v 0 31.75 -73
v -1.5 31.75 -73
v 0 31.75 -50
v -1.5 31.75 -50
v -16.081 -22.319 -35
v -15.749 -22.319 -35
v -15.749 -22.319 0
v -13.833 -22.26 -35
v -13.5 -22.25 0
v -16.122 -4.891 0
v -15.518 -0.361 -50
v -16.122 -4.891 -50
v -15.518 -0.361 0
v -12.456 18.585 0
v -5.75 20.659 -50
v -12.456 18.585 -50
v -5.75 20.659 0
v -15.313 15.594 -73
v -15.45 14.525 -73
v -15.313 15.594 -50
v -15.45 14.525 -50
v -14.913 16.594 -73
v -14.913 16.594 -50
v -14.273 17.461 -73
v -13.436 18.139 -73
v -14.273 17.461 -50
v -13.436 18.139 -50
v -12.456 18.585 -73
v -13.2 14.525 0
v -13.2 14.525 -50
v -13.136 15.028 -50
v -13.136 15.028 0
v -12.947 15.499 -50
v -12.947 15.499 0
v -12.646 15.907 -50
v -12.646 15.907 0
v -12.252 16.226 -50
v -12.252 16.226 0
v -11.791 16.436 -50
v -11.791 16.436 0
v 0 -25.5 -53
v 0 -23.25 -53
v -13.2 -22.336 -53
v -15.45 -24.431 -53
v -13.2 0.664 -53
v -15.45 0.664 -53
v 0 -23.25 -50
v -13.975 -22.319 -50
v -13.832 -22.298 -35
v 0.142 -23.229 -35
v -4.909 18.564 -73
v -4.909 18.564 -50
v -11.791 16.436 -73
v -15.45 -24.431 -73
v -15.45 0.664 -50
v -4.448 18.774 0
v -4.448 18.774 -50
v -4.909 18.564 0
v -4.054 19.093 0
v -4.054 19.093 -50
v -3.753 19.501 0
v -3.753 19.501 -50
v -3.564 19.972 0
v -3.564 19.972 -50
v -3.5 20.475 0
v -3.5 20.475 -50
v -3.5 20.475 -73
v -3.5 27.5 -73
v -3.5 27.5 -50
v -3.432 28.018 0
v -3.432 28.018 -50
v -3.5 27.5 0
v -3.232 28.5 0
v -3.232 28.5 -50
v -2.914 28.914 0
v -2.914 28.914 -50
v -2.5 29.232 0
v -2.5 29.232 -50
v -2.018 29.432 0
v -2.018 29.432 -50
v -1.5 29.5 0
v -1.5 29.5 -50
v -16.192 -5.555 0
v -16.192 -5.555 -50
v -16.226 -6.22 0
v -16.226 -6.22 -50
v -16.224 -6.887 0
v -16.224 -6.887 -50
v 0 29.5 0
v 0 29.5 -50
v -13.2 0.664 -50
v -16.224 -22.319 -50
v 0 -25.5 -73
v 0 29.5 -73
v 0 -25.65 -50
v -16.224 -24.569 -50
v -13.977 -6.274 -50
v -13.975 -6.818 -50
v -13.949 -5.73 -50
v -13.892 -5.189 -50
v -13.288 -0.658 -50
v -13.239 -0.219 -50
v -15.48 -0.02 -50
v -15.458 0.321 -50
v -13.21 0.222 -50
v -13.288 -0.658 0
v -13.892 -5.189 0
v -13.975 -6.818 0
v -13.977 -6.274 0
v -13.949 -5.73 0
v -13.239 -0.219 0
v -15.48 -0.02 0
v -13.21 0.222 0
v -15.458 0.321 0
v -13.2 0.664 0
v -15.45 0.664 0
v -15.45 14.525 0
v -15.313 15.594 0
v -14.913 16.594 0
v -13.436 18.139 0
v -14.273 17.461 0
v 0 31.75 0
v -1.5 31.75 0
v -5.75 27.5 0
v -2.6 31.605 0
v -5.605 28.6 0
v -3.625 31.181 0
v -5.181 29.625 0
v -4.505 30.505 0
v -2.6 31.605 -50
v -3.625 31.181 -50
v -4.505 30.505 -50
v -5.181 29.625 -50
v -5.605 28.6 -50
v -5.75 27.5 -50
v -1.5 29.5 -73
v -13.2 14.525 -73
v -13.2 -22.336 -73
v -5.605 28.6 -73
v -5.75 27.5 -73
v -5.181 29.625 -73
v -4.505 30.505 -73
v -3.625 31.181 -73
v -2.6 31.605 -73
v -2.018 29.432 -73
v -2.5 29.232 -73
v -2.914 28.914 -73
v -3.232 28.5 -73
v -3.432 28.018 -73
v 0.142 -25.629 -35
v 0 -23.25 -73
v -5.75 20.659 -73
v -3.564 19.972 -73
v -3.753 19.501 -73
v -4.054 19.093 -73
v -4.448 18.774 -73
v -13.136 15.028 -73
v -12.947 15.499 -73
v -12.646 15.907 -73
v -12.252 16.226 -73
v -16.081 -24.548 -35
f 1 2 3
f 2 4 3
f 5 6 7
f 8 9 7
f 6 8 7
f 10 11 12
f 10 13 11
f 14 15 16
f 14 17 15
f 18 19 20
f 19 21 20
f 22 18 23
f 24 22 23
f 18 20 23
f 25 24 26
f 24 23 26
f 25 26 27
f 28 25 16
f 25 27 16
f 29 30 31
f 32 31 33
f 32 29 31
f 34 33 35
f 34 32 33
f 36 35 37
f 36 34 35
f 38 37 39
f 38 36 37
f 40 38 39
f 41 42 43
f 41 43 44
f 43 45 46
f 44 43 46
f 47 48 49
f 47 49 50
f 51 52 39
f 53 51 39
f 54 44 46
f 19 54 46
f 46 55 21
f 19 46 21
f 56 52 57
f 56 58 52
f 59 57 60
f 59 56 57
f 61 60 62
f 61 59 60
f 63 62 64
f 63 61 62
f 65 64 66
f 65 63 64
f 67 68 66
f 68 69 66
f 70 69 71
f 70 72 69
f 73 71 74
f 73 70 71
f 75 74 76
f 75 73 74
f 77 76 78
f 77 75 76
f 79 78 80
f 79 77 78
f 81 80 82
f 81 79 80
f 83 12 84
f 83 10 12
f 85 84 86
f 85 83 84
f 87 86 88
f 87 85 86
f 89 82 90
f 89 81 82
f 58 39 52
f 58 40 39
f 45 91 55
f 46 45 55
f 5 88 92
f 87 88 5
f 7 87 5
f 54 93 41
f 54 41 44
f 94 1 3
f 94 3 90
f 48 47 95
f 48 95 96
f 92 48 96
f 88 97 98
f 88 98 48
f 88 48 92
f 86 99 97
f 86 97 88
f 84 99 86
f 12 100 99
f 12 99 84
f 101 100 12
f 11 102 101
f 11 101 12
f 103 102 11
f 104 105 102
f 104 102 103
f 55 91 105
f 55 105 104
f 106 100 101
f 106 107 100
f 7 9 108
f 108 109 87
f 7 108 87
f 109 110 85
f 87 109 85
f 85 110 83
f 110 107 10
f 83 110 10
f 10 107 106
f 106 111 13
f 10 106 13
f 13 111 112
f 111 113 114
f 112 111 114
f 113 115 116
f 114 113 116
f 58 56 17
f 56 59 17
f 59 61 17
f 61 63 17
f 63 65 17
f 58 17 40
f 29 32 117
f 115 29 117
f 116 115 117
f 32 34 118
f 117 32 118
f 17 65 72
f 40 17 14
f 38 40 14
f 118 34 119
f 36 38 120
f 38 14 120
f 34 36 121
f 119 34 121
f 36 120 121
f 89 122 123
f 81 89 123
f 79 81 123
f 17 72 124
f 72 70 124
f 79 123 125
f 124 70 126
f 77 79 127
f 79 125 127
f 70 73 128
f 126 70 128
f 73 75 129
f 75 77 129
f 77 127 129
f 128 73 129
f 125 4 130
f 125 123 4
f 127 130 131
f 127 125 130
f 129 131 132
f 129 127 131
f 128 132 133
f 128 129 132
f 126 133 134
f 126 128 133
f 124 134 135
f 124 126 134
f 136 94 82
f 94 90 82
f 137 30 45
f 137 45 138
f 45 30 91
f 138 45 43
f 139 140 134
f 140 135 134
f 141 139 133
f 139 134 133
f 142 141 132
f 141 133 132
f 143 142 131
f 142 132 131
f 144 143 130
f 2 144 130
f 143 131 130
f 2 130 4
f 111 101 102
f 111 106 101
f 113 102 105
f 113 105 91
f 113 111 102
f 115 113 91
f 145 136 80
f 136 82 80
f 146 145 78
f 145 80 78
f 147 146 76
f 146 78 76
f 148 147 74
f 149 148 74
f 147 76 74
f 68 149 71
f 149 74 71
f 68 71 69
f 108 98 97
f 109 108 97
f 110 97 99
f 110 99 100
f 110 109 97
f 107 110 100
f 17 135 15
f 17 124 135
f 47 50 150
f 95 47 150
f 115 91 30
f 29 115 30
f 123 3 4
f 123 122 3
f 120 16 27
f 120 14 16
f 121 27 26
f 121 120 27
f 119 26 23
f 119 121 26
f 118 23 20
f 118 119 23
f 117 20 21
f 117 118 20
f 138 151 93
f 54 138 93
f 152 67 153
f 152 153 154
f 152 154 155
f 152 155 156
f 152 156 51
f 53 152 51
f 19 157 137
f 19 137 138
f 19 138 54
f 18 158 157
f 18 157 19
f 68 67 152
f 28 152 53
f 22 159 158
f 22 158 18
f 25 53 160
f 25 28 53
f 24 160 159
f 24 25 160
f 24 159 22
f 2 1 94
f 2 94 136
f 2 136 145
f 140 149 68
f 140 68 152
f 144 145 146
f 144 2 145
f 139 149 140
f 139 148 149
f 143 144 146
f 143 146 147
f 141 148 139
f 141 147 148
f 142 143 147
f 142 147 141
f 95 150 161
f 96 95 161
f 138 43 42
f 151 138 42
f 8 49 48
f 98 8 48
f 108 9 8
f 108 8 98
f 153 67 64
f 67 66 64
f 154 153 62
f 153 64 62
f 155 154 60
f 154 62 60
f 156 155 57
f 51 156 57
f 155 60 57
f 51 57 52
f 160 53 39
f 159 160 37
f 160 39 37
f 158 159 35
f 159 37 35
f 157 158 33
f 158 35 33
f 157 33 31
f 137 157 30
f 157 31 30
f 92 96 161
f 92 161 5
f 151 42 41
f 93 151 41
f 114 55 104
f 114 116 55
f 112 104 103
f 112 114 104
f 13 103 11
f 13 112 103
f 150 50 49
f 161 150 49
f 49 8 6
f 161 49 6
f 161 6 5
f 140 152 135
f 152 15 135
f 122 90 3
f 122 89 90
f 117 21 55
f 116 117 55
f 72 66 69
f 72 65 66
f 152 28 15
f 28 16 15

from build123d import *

# Parameters (mm, degrees)
F5_DEPTH  = 3
F6_W      = 2.25
F6_H      = 23
F7_DEPTH  = 20
F13_DEPTH = 35


with BuildPart() as f3:
    # F2 (on offset) → F3 section 0
    with BuildSketch(Plane.XY.offset(-50)):
        with BuildLine():
            Line((-3.5000038791, 20.4748884357), (-3.5000038791, 27.4999761514))
            ThreePointArc((-3.5000038791, 27.4999761514), (-2.9142174415, 28.9141897138), (-1.5000038791, 29.4999761514))
            Line((-1.5000038791, 29.4999761514), (-3.8791e-06, 29.4999761514))
            Line((-3.8791e-06, 29.4999761514), (-3.8791e-06, 31.7499761514))
            Line((-3.8791e-06, 31.7499761514), (-1.5000038791, 31.7499761514))
            ThreePointArc((-1.5000038791, 31.7499761514), (-4.5052076991, 30.5051799715), (-5.7500038791, 27.4999761514))
            Line((-5.7500038791, 27.4999761514), (-5.7500038791, 20.6592524712))
            Line((-5.7500038791, 20.6592524712), (-12.4557502015, 18.5853103096))
            ThreePointArc((-12.4557502015, 18.5853103096), (-14.6204878997, 17.0475208172), (-15.4500038791, 14.5250638671))
            Line((-15.4500038791, 14.5250638671), (-15.4500038791, 0.6637059035))
            ThreePointArc((-15.4500038791, 0.6637059035), (-15.4670184988, 0.1504446566), (-15.5179876488, -0.3605629272))
            Line((-15.5179876488, -0.3605629272), (-16.1221071747, -4.8914593715))
            ThreePointArc((-16.1221071747, -4.8914593715), (-16.2137025969, -5.8872580453), (-16.223770689, -6.887209721))
            Line((-16.223770689, -6.887209721), (-16.223770689, -22.3192218691))
            Line((-16.223770689, -22.3192218691), (-13.9748350221, -22.3192218691))
            Line((-13.9748350221, -22.3192218691), (-13.9748350221, -6.8180117005))
            ThreePointArc((-13.9748350221, -6.8180117005), (-13.9666161714, -6.0017246183), (-13.8918443982, -5.1888277417))
            Line((-13.8918443982, -5.1888277417), (-13.2877248723, -0.6579312974))
            ThreePointArc((-13.2877248723, -0.6579312974), (-13.2219582271, 0.0014333268), (-13.2000038791, 0.6637059035))
            Line((-13.2000038791, 0.6637059035), (-13.2000038791, 14.5250638671))
            ThreePointArc((-13.2000038791, 14.5250638671), (-12.8096434182, 15.7121024319), (-11.790943325, 16.4357680754))
            Line((-11.790943325, 16.4357680754), (-4.9090644333, 18.5641842274))
            ThreePointArc((-4.9090644333, 18.5641842274), (-3.89036434, 19.2878498709), (-3.5000038791, 20.4748884357))
        make_face()
    # F0 (on Top) → F3 section 1
    with BuildSketch(Plane.XY):
        with BuildLine():
            Line((-3.5, 20.4749122843), (-3.5, 27.5))
            ThreePointArc((-3.5, 27.5), (-2.9142135624, 28.9142135624), (-1.5, 29.5))
            Line((-1.5, 29.5), (0, 29.5))
            Line((0, 29.5), (0, 31.75))
            Line((0, 31.75), (-1.5, 31.75))
            ThreePointArc((-1.5, 31.75), (-4.50520382, 30.50520382), (-5.75, 27.5))
            Line((-5.75, 27.5), (-5.75, 20.6592763198))
            Line((-5.75, 20.6592763198), (-12.4557463224, 18.5853341582))
            ThreePointArc((-12.4557463224, 18.5853341582), (-14.6204840206, 17.0475446658), (-15.45, 14.5250877157))
            Line((-15.45, 14.5250877157), (-15.45, 0.6637297521))
            ThreePointArc((-15.45, 0.6637297521), (-15.4670146197, 0.1504685052), (-15.5179837697, -0.3605390786))
            Line((-15.5179837697, -0.3605390786), (-16.1221032956, -4.8914355229))
            ThreePointArc((-16.1221032956, -4.8914355229), (-16.2136987178, -5.8872341967), (-16.2237668099, -6.8871858724))
            Line((-16.2237668099, -6.8871858724), (-15.7489356669, -22.3191980205))
            Line((-15.7489356669, -22.3191980205), (-13.5, -22.25))
            Line((-13.5, -22.25), (-13.974831143, -6.8179878519))
            ThreePointArc((-13.974831143, -6.8179878519), (-13.9666122923, -6.0017007697), (-13.8918405191, -5.1888038931))
            Line((-13.8918405191, -5.1888038931), (-13.2877209932, -0.6579074488))
            ThreePointArc((-13.2877209932, -0.6579074488), (-13.221954348, 0.0014571754), (-13.2, 0.6637297521))
            Line((-13.2, 0.6637297521), (-13.2, 14.5250877157))
            ThreePointArc((-13.2, 14.5250877157), (-12.8096395391, 15.7121262805), (-11.7909394458, 16.435791924))
            Line((-11.7909394458, 16.435791924), (-4.9090605542, 18.564208076))
            ThreePointArc((-4.9090605542, 18.564208076), (-3.8903604609, 19.2878737195), (-3.5, 20.4749122843))
        make_face()
    loft()

    # F4 (on face) → F5 (join)
    with BuildSketch(Plane(origin=(0, 0, -50), x_dir=(1, 0, 0), z_dir=(0, 0, -1))):
        with BuildLine():
            Line((-13.2000038791, -0.6637059035), (-15.4500038791, -0.6637059035))
            Line((-15.4500038791, -0.6637059035), (-15.4500038791, -14.5250638671))
            ThreePointArc((-15.4500038791, -14.5250638671), (-14.6204878997, -17.0475208172), (-12.4557502015, -18.5853103096))
            Line((-12.4557502015, -18.5853103096), (-5.7500038791, -20.6592524712))
            Line((-5.7500038791, -20.6592524712), (-5.7500038791, -27.4999761514))
            ThreePointArc((-5.7500038791, -27.4999761514), (-4.5052076991, -30.5051799715), (-1.5000038791, -31.7499761514))
            Line((-1.5000038791, -31.7499761514), (-3.8791e-06, -31.7499761514))
            Line((-3.8791e-06, -31.7499761514), (-3.8791e-06, -29.4999761514))
            Line((-3.8791e-06, -29.4999761514), (-1.5000038791, -29.4999761514))
            ThreePointArc((-1.5000038791, -29.4999761514), (-2.9142174415, -28.9141897138), (-3.5000038791, -27.4999761514))
            Line((-3.5000038791, -27.4999761514), (-3.5000038791, -20.4748884357))
            ThreePointArc((-3.5000038791, -20.4748884357), (-3.89036434, -19.2878498709), (-4.9090644333, -18.5641842274))
            Line((-4.9090644333, -18.5641842274), (-11.790943325, -16.4357680754))
            ThreePointArc((-11.790943325, -16.4357680754), (-12.8096434182, -15.7121024319), (-13.2000038791, -14.5250638671))
            Line((-13.2000038791, -14.5250638671), (-13.2000038791, -0.6637059035))
        make_face()
    extrude(amount=F5_DEPTH)

    # F6 (on face) → F7 (join)
    with BuildSketch(Plane(origin=(0, 0, -53), x_dir=(1, 0, 0), z_dir=(0, 0, -1))):
        with BuildLine():
            Line((-13.2000038791, -14.5250638671), (-13.2000038791, -0.6637059035))
            Line((-13.2000038791, -0.6637059035), (-15.4500038791, -0.6637059035))
            Line((-15.4500038791, -0.6637059035), (-15.4500038791, -14.5250638671))
            ThreePointArc((-15.4500038791, -14.5250638671), (-14.6204878997, -17.0475208172), (-12.4557502015, -18.5853103096))
            Line((-12.4557502015, -18.5853103096), (-5.7500038791, -20.6592524712))
            Line((-5.7500038791, -20.6592524712), (-5.7500038791, -27.4999761514))
            ThreePointArc((-5.7500038791, -27.4999761514), (-4.5052076991, -30.5051799715), (-1.5000038791, -31.7499761514))
            Line((-1.5000038791, -31.7499761514), (-3.8791e-06, -31.7499761514))
            Line((-3.8791e-06, -31.7499761514), (-3.8791e-06, -29.4999761514))
            Line((-3.8791e-06, -29.4999761514), (-1.5000038791, -29.4999761514))
            ThreePointArc((-1.5000038791, -29.4999761514), (-2.9142174415, -28.9141897138), (-3.5000038791, -27.4999761514))
            Line((-3.5000038791, -27.4999761514), (-3.5000038791, -20.4748884357))
            ThreePointArc((-3.5000038791, -20.4748884357), (-3.89036434, -19.2878498709), (-4.9090644333, -18.5641842274))
            Line((-4.9090644333, -18.5641842274), (-11.790943325, -16.4357680754))
            ThreePointArc((-11.790943325, -16.4357680754), (-12.8096434182, -15.7121024319), (-13.2000038791, -14.5250638671))
        make_face()
        with Locations((-14.3250038791, 10.8362940965)):
            Rectangle(F6_W, F6_H)
    extrude(amount=F7_DEPTH)

    # F10: sweep along a path in F10_path
    with BuildLine(Plane(origin=(-15.4500038791, -22.3362940965, -73), x_dir=(0, 0, -1), z_dir=(0, 1, 0))) as f10_path:
        Line((0, 0), (-20, 0))
    # F8 (on face) → F10 (sweep)
    with BuildSketch(Plane(origin=(0, 0, -73), x_dir=(1, 0, 0), z_dir=(0, 0, -1))):
        Polygon((-15.4500038791, 22.3362940965), (-13.2000038791, 22.3362940965), (0, 23.2500238486), (0, 25.5000238486), (-15.4500038791, 24.4305447527), align=None)
    sweep(path=f10_path.line)

    # F11: sweep along a path in F11_path
    with BuildLine(Plane(origin=(-13.9748350221, -22.3192218691, -50), x_dir=(-0.0094962722, 0, -0.9999549094), z_dir=(-0.9999549094, 0, 0.0094962722))) as f11_path:
        add(Plane(origin=(-13.9748350221, -22.3192218691, -50), x_dir=(-0.0094962722, 0, -0.9999549094), z_dir=(-0.9999549094, 0, 0.0094962722)) * Edge.make_bspline(
            [(0, 0), (-50.0022546321, -0.0692218691)],
            knots=[0, 0, 1, 1], degree=1))
    # F9 (on face) → F11 (sweep)
    with BuildSketch(Plane(origin=(0, 0, -50), x_dir=(1, 0, 0), z_dir=(0, 0, -1))):
        Polygon((-16.223770689, 22.3192218691), (-13.9748350221, 22.3192218691), (0, 23.2500238486), (0, 25.649815511), (-16.223770689, 24.5692218691), align=None)
    sweep(path=f11_path.line)

    # F12 (on face) → F13 (cut)
    with BuildSketch(Plane.XY):
        with BuildLine():
            add(Edge.make_bspline(
                [(-13.5, -22.25), (0.4748350221, -23.1808019795)],
                knots=[0, 0, 14.0057990211, 14.0057990211], degree=1))
            Line((-13.5, -22.25), (-15.7489356669, -22.3191980205))
            add(Edge.make_bspline(
                [(-15.7489356669, -24.5), (-15.7489356669, -22.3191980205)],
                knots=[0, 0, 2.1808019795, 2.1808019795], degree=1))
            add(Edge.make_bspline(
                [(0.4748350221, -25.5805936419), (-15.7489356669, -24.5)],
                knots=[0, 0, 16.2597176479, 16.2597176479], degree=1))
            add(Edge.make_bspline(
                [(0.4748350221, -23.1808019795), (0.4748350221, -25.5805936419)],
                knots=[0, 0, 2.3997916625, 2.3997916625], degree=1))
        make_face()
        with BuildLine():
            Line((1.4795829775, -22.3191980205), (-13.5, -22.25))
            add(Edge.make_bspline(
                [(-13.5, -22.25), (0.4748350221, -23.1808019795)],
                knots=[0, 0, 14.0057990211, 14.0057990211], degree=1))
            add(Edge.make_bspline(
                [(0.4748350221, -23.1808019795), (0.4748350221, -25.5805936419)],
                knots=[0, 0, 2.3997916625, 2.3997916625], degree=1))
            add(Edge.make_bspline(
                [(0.4748350221, -25.5805936419), (-15.7489356669, -24.5)],
                knots=[0, 0, 16.2597176479, 16.2597176479], degree=1))
            add(Edge.make_bspline(
                [(-15.7489356669, -24.5), (-15.7489356669, -22.3191980205)],
                knots=[0, 0, 2.1808019795, 2.1808019795], degree=1))
            Line((-15.7489356669, -22.3191980205), (-16.8508291245, -22.3191980205))
            Line((-16.8508291245, -22.3191980205), (-16.8508291245, -25.5727563053))
            Line((-16.8508291245, -25.5727563053), (1.4795829775, -27.0518492907))
            Line((1.4795829775, -27.0518492907), (1.4795829775, -22.3191980205))
        make_face()
    extrude(amount=-F13_DEPTH, mode=Mode.SUBTRACT)


solid = f3.part
